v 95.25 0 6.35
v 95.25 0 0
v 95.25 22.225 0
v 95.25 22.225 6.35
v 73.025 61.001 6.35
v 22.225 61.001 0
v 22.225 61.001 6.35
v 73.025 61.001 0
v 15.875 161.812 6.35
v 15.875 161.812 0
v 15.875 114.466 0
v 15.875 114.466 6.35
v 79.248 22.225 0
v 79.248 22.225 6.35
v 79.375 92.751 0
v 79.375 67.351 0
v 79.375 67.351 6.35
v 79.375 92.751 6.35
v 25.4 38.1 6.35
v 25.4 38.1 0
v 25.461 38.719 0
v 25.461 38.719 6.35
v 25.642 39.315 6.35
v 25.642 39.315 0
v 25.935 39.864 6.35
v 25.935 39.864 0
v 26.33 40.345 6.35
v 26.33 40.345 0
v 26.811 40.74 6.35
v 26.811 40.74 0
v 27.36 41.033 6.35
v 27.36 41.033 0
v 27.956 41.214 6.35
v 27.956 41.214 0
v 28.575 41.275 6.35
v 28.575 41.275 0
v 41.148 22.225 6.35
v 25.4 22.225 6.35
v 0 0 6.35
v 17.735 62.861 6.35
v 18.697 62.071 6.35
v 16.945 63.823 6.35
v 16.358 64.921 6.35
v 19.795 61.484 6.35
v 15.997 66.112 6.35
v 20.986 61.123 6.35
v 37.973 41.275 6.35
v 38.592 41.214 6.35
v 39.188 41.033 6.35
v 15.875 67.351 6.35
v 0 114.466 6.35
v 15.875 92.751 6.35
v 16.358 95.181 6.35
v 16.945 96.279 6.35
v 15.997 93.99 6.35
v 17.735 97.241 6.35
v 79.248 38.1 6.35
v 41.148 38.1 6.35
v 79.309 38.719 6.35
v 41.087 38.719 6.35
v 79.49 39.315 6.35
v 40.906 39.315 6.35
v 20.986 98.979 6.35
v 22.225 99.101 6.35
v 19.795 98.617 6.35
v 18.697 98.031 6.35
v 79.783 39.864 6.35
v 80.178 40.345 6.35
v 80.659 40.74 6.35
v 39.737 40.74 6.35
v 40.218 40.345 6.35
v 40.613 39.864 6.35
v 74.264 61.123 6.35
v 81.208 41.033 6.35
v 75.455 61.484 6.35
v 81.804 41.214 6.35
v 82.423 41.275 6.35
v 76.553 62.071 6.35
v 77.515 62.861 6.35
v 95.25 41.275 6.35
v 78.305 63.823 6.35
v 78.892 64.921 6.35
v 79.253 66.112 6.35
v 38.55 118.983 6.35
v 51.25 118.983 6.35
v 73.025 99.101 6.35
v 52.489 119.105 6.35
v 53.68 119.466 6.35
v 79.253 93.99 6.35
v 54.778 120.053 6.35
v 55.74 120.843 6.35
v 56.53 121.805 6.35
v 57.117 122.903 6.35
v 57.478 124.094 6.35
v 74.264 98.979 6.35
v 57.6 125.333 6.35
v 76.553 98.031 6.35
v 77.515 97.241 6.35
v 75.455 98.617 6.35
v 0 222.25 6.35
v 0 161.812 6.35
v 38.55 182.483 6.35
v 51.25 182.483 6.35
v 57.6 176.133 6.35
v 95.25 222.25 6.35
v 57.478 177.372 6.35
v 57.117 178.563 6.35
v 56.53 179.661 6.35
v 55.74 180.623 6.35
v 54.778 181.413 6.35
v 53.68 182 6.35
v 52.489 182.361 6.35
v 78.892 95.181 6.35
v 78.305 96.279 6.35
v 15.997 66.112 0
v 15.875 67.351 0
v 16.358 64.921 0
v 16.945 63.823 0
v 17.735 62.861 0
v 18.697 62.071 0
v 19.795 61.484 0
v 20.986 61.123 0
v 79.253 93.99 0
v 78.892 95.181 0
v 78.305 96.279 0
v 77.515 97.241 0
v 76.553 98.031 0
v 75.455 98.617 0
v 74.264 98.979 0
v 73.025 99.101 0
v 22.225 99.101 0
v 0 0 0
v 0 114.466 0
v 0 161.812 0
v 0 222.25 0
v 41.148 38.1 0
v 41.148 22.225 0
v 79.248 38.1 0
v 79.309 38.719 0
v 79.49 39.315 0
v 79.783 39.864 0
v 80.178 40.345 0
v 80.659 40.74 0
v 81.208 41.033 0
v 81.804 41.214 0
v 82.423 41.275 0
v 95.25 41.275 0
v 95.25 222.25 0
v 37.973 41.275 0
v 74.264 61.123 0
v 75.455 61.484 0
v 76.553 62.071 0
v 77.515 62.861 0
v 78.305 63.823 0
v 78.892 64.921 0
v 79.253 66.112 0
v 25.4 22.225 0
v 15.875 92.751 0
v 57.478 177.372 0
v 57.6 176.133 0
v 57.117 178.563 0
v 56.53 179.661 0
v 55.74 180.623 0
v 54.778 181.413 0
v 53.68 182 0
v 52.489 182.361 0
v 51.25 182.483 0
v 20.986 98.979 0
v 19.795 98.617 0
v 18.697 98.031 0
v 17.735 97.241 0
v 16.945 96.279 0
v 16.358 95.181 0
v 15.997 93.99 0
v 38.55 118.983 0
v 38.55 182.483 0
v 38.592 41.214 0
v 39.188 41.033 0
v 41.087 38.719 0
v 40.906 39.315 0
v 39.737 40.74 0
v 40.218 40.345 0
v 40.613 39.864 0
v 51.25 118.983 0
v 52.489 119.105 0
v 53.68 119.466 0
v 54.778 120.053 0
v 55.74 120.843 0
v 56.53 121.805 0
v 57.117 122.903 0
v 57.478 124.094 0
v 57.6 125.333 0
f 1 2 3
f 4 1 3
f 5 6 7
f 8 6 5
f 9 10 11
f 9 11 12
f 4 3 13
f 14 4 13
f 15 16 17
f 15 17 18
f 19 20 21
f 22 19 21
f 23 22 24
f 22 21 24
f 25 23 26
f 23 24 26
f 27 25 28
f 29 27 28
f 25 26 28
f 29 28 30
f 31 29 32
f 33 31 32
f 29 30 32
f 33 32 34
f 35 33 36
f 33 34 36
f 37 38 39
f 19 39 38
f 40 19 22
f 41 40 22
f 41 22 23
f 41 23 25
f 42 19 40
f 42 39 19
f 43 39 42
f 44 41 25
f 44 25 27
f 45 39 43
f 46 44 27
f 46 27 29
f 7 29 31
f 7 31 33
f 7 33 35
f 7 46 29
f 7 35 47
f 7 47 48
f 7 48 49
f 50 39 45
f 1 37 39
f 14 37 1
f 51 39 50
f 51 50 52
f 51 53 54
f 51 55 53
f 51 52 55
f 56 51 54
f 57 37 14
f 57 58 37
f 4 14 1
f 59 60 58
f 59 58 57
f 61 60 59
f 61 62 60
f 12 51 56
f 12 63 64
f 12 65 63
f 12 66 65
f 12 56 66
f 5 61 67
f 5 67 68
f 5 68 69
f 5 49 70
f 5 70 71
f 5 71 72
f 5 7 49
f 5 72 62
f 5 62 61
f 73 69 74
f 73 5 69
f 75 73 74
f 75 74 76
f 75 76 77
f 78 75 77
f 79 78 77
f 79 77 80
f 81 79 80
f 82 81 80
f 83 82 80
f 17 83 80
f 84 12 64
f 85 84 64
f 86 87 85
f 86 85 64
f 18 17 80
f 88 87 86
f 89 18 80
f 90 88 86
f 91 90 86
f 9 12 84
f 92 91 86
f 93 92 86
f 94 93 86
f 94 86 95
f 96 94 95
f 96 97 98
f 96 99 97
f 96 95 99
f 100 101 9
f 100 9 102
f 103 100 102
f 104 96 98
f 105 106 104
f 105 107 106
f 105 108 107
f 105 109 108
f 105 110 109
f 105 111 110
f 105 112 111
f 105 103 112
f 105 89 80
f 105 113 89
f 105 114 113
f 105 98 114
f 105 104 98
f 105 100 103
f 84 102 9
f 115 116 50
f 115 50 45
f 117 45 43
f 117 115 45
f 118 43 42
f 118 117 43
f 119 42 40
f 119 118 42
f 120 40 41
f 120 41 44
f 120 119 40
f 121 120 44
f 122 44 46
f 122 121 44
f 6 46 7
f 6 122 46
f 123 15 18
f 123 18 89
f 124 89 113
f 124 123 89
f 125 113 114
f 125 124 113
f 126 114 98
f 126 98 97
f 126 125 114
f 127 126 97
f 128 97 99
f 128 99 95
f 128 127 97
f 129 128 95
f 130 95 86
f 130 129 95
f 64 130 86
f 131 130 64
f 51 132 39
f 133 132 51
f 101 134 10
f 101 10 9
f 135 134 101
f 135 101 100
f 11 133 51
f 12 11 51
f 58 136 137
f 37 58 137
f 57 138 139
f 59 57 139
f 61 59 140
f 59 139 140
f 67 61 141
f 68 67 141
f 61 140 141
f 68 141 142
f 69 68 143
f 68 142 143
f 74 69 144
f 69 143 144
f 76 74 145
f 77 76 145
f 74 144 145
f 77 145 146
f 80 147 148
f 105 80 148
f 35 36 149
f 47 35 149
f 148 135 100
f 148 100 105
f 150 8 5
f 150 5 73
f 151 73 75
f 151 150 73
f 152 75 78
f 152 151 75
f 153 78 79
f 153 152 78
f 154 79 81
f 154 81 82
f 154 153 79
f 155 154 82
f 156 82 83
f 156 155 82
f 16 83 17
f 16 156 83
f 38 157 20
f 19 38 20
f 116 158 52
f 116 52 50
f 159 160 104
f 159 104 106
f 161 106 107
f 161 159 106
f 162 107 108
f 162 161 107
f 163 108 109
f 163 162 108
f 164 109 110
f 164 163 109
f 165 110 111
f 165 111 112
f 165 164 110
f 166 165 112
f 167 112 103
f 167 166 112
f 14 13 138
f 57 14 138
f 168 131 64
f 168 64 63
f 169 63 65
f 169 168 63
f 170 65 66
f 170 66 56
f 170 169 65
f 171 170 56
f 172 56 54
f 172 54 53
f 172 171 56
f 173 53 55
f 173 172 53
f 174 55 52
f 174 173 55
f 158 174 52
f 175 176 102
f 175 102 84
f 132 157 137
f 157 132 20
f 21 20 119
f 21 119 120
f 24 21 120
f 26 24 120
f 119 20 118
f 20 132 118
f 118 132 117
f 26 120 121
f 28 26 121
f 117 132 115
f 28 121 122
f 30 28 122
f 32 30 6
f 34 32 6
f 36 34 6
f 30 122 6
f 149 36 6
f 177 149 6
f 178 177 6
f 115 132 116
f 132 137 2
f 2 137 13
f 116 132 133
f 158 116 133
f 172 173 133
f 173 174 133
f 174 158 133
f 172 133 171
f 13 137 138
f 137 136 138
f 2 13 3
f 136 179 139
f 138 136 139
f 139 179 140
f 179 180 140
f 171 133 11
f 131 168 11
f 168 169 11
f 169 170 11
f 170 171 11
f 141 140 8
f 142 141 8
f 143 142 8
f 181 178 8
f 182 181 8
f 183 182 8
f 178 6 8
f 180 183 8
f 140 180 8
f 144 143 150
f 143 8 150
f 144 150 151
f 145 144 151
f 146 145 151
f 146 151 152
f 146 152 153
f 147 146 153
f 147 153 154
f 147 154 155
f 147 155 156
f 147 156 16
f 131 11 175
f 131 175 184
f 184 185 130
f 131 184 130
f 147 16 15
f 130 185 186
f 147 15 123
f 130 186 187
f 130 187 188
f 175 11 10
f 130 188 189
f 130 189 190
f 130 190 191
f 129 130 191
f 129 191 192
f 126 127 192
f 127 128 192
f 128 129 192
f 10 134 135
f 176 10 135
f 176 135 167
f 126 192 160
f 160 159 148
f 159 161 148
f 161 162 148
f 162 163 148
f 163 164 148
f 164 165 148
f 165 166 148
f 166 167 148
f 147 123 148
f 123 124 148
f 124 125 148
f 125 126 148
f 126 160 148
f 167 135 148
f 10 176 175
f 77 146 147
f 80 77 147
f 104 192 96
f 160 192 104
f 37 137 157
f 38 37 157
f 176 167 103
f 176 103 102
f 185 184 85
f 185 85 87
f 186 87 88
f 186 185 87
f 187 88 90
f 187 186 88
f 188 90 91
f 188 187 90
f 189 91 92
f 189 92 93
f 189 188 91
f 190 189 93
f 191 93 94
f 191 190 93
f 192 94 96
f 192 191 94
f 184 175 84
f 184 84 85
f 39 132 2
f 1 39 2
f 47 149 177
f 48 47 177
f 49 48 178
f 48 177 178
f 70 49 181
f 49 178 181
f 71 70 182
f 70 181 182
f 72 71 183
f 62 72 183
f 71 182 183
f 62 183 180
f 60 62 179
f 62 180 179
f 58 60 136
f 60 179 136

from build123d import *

# Parameters (mm, degrees)
SKETCH1_W           = 95.25
SKETCH1_H           = 222.25
BOSS_EXTRUDE1_DEPTH = 6.35
SKETCH2_W           = 17.693613984
SKETCH2_H           = 47.346544424
CUT_EXTRUDE1_DEPTH  = 15.875
CUT_EXTRUDE2_DEPTH  = 6.35
CUT_EXTRUDE3_DEPTH  = 6.35
CUT_EXTRUDE4_DEPTH  = 6.35


with BuildPart() as part:
    # Sketch1 → Boss-Extrude1 (new body)
    with BuildSketch(Plane.XY):
        with Locations((47.625, 111.125)):
            Rectangle(SKETCH1_W, SKETCH1_H)
    extrude(amount=BOSS_EXTRUDE1_DEPTH)

    # Sketch2 → Cut-Extrude1 (cut)
    with BuildSketch(Plane.ZY):
        with Locations((4.668229677, 138.138859748)):
            Rectangle(SKETCH2_W, SKETCH2_H)
    extrude(amount=-CUT_EXTRUDE1_DEPTH, mode=Mode.SUBTRACT)

    # Sketch3 → Cut-Extrude2 (cut)
    with BuildSketch(Plane(origin=(0, 0, 0), x_dir=(-1, 0, 0), z_dir=(0, 0, -1))):
        with BuildLine():
            Line((-51.25, 182.483066433), (-38.55, 182.483066433))
            Line((-38.55, 182.483066433), (-38.55, 118.983066433))
            Line((-38.55, 118.983066433), (-51.25, 118.983066433))
            ThreePointArc((-51.25, 118.983066433), (-55.740128061, 120.842938372), (-57.6, 125.333066433))
            Line((-57.6, 125.333066433), (-57.6, 176.133066433))
            ThreePointArc((-57.6, 176.133066433), (-55.740128061, 180.623194493), (-51.25, 182.483066433))
        make_face()
    extrude(amount=-CUT_EXTRUDE2_DEPTH, mode=Mode.SUBTRACT)

    # Sketch4 → Cut-Extrude3 (cut)
    with BuildSketch(Plane(origin=(0, 0, 0), x_dir=(-1, 0, 0), z_dir=(0, 0, -1))):
        with BuildLine():
            Line((-73.025, 99.100693086), (-22.225, 99.100693086))
            ThreePointArc((-22.225, 99.100693086), (-17.734871939, 97.240821147), (-15.875, 92.750693086))
            Line((-15.875, 92.750693086), (-15.875, 67.350693086))
            ThreePointArc((-15.875, 67.350693086), (-17.734871939, 62.860565025), (-22.225, 61.000693086))
            Line((-22.225, 61.000693086), (-73.025, 61.000693086))
            ThreePointArc((-73.025, 61.000693086), (-77.515128061, 62.860565025), (-79.375, 67.350693086))
            Line((-79.375, 67.350693086), (-79.375, 92.750693086))
            ThreePointArc((-79.375, 92.750693086), (-77.515128061, 97.240821147), (-73.025, 99.100693086))
        make_face()
    extrude(amount=-CUT_EXTRUDE3_DEPTH, mode=Mode.SUBTRACT)

    # Sketch5 → Cut-Extrude4 (cut)
    with BuildSketch(Plane(origin=(0, 0, 0), x_dir=(-1, 0, 0), z_dir=(0, 0, -1))):
        with BuildLine():
            Line((-95.25, 22.225), (-79.248, 22.225))
            Line((-79.248, 22.225), (-79.248, 38.1))
            ThreePointArc((-79.248, 38.1), (-80.17793597, 40.34506403), (-82.423, 41.275))
            Line((-82.423, 41.275), (-95.25, 41.275))
            Line((-95.25, 41.275), (-95.25, 22.225))
        make_face()
        with BuildLine():
            Line((-25.4, 22.225), (-25.4, 38.1))
            ThreePointArc((-25.4, 38.1), (-26.32993597, 40.34506403), (-28.575, 41.275))
            Line((-28.575, 41.275), (-37.973, 41.275))
            ThreePointArc((-37.973, 41.275), (-40.21806403, 40.34506403), (-41.148, 38.1))
            Line((-41.148, 38.1), (-41.148, 22.225))
            Line((-41.148, 22.225), (-25.4, 22.225))
        make_face()
    extrude(amount=-CUT_EXTRUDE4_DEPTH, mode=Mode.SUBTRACT)


solid = part.part
